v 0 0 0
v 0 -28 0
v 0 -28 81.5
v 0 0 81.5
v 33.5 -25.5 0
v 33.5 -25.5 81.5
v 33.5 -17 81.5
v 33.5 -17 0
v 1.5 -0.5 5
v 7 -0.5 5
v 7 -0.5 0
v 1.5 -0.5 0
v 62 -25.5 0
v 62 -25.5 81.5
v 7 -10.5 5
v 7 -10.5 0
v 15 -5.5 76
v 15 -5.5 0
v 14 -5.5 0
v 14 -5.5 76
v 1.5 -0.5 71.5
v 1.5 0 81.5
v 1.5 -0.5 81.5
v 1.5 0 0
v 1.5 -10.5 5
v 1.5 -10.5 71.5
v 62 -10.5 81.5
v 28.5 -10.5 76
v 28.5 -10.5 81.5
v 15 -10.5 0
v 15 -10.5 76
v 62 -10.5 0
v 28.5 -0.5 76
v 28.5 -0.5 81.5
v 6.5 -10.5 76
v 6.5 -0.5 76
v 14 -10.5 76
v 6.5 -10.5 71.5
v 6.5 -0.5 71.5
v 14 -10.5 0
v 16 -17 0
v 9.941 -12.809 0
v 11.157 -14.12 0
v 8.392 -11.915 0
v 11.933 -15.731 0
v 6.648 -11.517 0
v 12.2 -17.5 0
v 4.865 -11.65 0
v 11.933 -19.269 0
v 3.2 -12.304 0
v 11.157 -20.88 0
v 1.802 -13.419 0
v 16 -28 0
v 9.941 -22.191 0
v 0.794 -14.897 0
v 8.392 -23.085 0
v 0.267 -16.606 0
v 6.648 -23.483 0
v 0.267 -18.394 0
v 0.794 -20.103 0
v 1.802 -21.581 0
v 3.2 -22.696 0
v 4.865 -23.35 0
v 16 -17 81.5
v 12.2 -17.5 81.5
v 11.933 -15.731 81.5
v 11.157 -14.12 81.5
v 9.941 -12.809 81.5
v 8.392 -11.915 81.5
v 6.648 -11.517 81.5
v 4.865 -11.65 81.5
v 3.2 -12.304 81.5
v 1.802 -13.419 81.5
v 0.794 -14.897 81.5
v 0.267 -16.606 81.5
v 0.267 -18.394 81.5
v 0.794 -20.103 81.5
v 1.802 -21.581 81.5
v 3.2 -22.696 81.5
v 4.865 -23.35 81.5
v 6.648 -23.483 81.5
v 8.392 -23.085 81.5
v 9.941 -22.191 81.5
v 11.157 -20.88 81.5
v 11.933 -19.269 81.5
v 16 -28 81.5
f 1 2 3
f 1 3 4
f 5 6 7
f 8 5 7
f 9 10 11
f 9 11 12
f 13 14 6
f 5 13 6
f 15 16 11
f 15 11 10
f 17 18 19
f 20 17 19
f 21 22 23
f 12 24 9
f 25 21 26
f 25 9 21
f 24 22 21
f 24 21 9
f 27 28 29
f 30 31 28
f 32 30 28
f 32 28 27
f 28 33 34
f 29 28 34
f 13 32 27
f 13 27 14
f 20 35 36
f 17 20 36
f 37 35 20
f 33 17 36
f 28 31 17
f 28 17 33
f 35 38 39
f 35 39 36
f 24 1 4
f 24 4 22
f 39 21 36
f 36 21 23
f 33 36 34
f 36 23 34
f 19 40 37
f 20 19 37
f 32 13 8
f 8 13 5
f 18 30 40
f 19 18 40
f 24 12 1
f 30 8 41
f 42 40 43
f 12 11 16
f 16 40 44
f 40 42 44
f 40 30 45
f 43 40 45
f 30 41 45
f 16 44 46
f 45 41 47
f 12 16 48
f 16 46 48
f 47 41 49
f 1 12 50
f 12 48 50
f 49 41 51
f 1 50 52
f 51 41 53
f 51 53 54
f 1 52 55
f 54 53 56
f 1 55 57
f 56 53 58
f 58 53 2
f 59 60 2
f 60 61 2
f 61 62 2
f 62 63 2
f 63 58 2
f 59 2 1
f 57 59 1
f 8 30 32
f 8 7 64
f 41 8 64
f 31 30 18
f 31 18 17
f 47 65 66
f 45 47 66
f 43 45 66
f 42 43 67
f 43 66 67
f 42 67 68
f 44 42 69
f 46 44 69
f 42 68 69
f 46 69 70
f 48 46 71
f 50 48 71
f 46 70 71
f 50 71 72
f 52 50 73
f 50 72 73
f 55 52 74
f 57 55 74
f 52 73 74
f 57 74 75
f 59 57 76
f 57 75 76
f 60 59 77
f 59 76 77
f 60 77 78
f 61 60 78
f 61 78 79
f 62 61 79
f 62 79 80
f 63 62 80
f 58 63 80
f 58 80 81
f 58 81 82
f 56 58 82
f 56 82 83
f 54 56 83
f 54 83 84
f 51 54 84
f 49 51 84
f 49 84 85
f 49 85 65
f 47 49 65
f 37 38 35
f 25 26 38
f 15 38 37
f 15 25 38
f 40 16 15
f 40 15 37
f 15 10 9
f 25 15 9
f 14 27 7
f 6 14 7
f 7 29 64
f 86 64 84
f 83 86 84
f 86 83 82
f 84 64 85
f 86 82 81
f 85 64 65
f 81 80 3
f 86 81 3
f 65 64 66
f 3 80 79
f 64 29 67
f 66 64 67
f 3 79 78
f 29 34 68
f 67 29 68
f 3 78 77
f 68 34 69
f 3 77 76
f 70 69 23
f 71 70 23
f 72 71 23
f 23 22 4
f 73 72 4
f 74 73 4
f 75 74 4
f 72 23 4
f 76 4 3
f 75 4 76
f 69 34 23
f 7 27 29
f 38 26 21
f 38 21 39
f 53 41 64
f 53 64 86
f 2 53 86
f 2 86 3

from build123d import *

# Parameters (mm, degrees)
PAD_DEPTH    = 81.5
SKETCH001_R  = 6
POCKET_DEPTH = 81.501
SKETCH002_W  = 5.5
SKETCH002_H  = 5
PAD001_DEPTH = 10
SKETCH003_W  = 1
SKETCH003_H  = 81.5
PAD002_DEPTH = 5


with BuildPart() as part:
    # Sketch → Pad (new body)
    with BuildSketch(Plane.XY):
        Polygon((62, -10.5), (62, -25.5), (33.5, -25.5), (33.5, -17), (16, -17), (16, -28), (0, -28), (0, 0), (1.5, 0), (1.5, -10.5), align=None)
    extrude(amount=PAD_DEPTH)

    # Sketch001 (on Face12 of Pad) → Pocket (cut, through all)
    with BuildSketch(Plane.XY.offset(81.5)):
        with Locations((6.2, -17.5)):
            Circle(SKETCH001_R)
    extrude(amount=-POCKET_DEPTH, mode=Mode.SUBTRACT)

    # Sketch002 (on Face12 of Pocket) → Pad001 (join)
    with BuildSketch(Plane(origin=(0, -10.5, 0), x_dir=(-1, 0, 0), z_dir=(0, 1, 0))):
        with Locations((-4.25, 2.5)):
            Rectangle(SKETCH002_W, SKETCH002_H)
        Polygon((-28.5, 81.5), (-1.5, 81.5), (-1.5, 71.5), (-6.5, 71.5), (-6.5, 76), (-28.5, 76), align=None)
    extrude(amount=PAD001_DEPTH)

    # Sketch003 (on Face13 of Pad001) → Pad002 (join)
    with BuildSketch(Plane(origin=(0, -10.5, 0), x_dir=(-1, 0, 0), z_dir=(0, 1, 0))):
        with Locations((-14.5, 40.75)):
            Rectangle(SKETCH003_W, SKETCH003_H)
    extrude(amount=PAD002_DEPTH)


solid = part.part
